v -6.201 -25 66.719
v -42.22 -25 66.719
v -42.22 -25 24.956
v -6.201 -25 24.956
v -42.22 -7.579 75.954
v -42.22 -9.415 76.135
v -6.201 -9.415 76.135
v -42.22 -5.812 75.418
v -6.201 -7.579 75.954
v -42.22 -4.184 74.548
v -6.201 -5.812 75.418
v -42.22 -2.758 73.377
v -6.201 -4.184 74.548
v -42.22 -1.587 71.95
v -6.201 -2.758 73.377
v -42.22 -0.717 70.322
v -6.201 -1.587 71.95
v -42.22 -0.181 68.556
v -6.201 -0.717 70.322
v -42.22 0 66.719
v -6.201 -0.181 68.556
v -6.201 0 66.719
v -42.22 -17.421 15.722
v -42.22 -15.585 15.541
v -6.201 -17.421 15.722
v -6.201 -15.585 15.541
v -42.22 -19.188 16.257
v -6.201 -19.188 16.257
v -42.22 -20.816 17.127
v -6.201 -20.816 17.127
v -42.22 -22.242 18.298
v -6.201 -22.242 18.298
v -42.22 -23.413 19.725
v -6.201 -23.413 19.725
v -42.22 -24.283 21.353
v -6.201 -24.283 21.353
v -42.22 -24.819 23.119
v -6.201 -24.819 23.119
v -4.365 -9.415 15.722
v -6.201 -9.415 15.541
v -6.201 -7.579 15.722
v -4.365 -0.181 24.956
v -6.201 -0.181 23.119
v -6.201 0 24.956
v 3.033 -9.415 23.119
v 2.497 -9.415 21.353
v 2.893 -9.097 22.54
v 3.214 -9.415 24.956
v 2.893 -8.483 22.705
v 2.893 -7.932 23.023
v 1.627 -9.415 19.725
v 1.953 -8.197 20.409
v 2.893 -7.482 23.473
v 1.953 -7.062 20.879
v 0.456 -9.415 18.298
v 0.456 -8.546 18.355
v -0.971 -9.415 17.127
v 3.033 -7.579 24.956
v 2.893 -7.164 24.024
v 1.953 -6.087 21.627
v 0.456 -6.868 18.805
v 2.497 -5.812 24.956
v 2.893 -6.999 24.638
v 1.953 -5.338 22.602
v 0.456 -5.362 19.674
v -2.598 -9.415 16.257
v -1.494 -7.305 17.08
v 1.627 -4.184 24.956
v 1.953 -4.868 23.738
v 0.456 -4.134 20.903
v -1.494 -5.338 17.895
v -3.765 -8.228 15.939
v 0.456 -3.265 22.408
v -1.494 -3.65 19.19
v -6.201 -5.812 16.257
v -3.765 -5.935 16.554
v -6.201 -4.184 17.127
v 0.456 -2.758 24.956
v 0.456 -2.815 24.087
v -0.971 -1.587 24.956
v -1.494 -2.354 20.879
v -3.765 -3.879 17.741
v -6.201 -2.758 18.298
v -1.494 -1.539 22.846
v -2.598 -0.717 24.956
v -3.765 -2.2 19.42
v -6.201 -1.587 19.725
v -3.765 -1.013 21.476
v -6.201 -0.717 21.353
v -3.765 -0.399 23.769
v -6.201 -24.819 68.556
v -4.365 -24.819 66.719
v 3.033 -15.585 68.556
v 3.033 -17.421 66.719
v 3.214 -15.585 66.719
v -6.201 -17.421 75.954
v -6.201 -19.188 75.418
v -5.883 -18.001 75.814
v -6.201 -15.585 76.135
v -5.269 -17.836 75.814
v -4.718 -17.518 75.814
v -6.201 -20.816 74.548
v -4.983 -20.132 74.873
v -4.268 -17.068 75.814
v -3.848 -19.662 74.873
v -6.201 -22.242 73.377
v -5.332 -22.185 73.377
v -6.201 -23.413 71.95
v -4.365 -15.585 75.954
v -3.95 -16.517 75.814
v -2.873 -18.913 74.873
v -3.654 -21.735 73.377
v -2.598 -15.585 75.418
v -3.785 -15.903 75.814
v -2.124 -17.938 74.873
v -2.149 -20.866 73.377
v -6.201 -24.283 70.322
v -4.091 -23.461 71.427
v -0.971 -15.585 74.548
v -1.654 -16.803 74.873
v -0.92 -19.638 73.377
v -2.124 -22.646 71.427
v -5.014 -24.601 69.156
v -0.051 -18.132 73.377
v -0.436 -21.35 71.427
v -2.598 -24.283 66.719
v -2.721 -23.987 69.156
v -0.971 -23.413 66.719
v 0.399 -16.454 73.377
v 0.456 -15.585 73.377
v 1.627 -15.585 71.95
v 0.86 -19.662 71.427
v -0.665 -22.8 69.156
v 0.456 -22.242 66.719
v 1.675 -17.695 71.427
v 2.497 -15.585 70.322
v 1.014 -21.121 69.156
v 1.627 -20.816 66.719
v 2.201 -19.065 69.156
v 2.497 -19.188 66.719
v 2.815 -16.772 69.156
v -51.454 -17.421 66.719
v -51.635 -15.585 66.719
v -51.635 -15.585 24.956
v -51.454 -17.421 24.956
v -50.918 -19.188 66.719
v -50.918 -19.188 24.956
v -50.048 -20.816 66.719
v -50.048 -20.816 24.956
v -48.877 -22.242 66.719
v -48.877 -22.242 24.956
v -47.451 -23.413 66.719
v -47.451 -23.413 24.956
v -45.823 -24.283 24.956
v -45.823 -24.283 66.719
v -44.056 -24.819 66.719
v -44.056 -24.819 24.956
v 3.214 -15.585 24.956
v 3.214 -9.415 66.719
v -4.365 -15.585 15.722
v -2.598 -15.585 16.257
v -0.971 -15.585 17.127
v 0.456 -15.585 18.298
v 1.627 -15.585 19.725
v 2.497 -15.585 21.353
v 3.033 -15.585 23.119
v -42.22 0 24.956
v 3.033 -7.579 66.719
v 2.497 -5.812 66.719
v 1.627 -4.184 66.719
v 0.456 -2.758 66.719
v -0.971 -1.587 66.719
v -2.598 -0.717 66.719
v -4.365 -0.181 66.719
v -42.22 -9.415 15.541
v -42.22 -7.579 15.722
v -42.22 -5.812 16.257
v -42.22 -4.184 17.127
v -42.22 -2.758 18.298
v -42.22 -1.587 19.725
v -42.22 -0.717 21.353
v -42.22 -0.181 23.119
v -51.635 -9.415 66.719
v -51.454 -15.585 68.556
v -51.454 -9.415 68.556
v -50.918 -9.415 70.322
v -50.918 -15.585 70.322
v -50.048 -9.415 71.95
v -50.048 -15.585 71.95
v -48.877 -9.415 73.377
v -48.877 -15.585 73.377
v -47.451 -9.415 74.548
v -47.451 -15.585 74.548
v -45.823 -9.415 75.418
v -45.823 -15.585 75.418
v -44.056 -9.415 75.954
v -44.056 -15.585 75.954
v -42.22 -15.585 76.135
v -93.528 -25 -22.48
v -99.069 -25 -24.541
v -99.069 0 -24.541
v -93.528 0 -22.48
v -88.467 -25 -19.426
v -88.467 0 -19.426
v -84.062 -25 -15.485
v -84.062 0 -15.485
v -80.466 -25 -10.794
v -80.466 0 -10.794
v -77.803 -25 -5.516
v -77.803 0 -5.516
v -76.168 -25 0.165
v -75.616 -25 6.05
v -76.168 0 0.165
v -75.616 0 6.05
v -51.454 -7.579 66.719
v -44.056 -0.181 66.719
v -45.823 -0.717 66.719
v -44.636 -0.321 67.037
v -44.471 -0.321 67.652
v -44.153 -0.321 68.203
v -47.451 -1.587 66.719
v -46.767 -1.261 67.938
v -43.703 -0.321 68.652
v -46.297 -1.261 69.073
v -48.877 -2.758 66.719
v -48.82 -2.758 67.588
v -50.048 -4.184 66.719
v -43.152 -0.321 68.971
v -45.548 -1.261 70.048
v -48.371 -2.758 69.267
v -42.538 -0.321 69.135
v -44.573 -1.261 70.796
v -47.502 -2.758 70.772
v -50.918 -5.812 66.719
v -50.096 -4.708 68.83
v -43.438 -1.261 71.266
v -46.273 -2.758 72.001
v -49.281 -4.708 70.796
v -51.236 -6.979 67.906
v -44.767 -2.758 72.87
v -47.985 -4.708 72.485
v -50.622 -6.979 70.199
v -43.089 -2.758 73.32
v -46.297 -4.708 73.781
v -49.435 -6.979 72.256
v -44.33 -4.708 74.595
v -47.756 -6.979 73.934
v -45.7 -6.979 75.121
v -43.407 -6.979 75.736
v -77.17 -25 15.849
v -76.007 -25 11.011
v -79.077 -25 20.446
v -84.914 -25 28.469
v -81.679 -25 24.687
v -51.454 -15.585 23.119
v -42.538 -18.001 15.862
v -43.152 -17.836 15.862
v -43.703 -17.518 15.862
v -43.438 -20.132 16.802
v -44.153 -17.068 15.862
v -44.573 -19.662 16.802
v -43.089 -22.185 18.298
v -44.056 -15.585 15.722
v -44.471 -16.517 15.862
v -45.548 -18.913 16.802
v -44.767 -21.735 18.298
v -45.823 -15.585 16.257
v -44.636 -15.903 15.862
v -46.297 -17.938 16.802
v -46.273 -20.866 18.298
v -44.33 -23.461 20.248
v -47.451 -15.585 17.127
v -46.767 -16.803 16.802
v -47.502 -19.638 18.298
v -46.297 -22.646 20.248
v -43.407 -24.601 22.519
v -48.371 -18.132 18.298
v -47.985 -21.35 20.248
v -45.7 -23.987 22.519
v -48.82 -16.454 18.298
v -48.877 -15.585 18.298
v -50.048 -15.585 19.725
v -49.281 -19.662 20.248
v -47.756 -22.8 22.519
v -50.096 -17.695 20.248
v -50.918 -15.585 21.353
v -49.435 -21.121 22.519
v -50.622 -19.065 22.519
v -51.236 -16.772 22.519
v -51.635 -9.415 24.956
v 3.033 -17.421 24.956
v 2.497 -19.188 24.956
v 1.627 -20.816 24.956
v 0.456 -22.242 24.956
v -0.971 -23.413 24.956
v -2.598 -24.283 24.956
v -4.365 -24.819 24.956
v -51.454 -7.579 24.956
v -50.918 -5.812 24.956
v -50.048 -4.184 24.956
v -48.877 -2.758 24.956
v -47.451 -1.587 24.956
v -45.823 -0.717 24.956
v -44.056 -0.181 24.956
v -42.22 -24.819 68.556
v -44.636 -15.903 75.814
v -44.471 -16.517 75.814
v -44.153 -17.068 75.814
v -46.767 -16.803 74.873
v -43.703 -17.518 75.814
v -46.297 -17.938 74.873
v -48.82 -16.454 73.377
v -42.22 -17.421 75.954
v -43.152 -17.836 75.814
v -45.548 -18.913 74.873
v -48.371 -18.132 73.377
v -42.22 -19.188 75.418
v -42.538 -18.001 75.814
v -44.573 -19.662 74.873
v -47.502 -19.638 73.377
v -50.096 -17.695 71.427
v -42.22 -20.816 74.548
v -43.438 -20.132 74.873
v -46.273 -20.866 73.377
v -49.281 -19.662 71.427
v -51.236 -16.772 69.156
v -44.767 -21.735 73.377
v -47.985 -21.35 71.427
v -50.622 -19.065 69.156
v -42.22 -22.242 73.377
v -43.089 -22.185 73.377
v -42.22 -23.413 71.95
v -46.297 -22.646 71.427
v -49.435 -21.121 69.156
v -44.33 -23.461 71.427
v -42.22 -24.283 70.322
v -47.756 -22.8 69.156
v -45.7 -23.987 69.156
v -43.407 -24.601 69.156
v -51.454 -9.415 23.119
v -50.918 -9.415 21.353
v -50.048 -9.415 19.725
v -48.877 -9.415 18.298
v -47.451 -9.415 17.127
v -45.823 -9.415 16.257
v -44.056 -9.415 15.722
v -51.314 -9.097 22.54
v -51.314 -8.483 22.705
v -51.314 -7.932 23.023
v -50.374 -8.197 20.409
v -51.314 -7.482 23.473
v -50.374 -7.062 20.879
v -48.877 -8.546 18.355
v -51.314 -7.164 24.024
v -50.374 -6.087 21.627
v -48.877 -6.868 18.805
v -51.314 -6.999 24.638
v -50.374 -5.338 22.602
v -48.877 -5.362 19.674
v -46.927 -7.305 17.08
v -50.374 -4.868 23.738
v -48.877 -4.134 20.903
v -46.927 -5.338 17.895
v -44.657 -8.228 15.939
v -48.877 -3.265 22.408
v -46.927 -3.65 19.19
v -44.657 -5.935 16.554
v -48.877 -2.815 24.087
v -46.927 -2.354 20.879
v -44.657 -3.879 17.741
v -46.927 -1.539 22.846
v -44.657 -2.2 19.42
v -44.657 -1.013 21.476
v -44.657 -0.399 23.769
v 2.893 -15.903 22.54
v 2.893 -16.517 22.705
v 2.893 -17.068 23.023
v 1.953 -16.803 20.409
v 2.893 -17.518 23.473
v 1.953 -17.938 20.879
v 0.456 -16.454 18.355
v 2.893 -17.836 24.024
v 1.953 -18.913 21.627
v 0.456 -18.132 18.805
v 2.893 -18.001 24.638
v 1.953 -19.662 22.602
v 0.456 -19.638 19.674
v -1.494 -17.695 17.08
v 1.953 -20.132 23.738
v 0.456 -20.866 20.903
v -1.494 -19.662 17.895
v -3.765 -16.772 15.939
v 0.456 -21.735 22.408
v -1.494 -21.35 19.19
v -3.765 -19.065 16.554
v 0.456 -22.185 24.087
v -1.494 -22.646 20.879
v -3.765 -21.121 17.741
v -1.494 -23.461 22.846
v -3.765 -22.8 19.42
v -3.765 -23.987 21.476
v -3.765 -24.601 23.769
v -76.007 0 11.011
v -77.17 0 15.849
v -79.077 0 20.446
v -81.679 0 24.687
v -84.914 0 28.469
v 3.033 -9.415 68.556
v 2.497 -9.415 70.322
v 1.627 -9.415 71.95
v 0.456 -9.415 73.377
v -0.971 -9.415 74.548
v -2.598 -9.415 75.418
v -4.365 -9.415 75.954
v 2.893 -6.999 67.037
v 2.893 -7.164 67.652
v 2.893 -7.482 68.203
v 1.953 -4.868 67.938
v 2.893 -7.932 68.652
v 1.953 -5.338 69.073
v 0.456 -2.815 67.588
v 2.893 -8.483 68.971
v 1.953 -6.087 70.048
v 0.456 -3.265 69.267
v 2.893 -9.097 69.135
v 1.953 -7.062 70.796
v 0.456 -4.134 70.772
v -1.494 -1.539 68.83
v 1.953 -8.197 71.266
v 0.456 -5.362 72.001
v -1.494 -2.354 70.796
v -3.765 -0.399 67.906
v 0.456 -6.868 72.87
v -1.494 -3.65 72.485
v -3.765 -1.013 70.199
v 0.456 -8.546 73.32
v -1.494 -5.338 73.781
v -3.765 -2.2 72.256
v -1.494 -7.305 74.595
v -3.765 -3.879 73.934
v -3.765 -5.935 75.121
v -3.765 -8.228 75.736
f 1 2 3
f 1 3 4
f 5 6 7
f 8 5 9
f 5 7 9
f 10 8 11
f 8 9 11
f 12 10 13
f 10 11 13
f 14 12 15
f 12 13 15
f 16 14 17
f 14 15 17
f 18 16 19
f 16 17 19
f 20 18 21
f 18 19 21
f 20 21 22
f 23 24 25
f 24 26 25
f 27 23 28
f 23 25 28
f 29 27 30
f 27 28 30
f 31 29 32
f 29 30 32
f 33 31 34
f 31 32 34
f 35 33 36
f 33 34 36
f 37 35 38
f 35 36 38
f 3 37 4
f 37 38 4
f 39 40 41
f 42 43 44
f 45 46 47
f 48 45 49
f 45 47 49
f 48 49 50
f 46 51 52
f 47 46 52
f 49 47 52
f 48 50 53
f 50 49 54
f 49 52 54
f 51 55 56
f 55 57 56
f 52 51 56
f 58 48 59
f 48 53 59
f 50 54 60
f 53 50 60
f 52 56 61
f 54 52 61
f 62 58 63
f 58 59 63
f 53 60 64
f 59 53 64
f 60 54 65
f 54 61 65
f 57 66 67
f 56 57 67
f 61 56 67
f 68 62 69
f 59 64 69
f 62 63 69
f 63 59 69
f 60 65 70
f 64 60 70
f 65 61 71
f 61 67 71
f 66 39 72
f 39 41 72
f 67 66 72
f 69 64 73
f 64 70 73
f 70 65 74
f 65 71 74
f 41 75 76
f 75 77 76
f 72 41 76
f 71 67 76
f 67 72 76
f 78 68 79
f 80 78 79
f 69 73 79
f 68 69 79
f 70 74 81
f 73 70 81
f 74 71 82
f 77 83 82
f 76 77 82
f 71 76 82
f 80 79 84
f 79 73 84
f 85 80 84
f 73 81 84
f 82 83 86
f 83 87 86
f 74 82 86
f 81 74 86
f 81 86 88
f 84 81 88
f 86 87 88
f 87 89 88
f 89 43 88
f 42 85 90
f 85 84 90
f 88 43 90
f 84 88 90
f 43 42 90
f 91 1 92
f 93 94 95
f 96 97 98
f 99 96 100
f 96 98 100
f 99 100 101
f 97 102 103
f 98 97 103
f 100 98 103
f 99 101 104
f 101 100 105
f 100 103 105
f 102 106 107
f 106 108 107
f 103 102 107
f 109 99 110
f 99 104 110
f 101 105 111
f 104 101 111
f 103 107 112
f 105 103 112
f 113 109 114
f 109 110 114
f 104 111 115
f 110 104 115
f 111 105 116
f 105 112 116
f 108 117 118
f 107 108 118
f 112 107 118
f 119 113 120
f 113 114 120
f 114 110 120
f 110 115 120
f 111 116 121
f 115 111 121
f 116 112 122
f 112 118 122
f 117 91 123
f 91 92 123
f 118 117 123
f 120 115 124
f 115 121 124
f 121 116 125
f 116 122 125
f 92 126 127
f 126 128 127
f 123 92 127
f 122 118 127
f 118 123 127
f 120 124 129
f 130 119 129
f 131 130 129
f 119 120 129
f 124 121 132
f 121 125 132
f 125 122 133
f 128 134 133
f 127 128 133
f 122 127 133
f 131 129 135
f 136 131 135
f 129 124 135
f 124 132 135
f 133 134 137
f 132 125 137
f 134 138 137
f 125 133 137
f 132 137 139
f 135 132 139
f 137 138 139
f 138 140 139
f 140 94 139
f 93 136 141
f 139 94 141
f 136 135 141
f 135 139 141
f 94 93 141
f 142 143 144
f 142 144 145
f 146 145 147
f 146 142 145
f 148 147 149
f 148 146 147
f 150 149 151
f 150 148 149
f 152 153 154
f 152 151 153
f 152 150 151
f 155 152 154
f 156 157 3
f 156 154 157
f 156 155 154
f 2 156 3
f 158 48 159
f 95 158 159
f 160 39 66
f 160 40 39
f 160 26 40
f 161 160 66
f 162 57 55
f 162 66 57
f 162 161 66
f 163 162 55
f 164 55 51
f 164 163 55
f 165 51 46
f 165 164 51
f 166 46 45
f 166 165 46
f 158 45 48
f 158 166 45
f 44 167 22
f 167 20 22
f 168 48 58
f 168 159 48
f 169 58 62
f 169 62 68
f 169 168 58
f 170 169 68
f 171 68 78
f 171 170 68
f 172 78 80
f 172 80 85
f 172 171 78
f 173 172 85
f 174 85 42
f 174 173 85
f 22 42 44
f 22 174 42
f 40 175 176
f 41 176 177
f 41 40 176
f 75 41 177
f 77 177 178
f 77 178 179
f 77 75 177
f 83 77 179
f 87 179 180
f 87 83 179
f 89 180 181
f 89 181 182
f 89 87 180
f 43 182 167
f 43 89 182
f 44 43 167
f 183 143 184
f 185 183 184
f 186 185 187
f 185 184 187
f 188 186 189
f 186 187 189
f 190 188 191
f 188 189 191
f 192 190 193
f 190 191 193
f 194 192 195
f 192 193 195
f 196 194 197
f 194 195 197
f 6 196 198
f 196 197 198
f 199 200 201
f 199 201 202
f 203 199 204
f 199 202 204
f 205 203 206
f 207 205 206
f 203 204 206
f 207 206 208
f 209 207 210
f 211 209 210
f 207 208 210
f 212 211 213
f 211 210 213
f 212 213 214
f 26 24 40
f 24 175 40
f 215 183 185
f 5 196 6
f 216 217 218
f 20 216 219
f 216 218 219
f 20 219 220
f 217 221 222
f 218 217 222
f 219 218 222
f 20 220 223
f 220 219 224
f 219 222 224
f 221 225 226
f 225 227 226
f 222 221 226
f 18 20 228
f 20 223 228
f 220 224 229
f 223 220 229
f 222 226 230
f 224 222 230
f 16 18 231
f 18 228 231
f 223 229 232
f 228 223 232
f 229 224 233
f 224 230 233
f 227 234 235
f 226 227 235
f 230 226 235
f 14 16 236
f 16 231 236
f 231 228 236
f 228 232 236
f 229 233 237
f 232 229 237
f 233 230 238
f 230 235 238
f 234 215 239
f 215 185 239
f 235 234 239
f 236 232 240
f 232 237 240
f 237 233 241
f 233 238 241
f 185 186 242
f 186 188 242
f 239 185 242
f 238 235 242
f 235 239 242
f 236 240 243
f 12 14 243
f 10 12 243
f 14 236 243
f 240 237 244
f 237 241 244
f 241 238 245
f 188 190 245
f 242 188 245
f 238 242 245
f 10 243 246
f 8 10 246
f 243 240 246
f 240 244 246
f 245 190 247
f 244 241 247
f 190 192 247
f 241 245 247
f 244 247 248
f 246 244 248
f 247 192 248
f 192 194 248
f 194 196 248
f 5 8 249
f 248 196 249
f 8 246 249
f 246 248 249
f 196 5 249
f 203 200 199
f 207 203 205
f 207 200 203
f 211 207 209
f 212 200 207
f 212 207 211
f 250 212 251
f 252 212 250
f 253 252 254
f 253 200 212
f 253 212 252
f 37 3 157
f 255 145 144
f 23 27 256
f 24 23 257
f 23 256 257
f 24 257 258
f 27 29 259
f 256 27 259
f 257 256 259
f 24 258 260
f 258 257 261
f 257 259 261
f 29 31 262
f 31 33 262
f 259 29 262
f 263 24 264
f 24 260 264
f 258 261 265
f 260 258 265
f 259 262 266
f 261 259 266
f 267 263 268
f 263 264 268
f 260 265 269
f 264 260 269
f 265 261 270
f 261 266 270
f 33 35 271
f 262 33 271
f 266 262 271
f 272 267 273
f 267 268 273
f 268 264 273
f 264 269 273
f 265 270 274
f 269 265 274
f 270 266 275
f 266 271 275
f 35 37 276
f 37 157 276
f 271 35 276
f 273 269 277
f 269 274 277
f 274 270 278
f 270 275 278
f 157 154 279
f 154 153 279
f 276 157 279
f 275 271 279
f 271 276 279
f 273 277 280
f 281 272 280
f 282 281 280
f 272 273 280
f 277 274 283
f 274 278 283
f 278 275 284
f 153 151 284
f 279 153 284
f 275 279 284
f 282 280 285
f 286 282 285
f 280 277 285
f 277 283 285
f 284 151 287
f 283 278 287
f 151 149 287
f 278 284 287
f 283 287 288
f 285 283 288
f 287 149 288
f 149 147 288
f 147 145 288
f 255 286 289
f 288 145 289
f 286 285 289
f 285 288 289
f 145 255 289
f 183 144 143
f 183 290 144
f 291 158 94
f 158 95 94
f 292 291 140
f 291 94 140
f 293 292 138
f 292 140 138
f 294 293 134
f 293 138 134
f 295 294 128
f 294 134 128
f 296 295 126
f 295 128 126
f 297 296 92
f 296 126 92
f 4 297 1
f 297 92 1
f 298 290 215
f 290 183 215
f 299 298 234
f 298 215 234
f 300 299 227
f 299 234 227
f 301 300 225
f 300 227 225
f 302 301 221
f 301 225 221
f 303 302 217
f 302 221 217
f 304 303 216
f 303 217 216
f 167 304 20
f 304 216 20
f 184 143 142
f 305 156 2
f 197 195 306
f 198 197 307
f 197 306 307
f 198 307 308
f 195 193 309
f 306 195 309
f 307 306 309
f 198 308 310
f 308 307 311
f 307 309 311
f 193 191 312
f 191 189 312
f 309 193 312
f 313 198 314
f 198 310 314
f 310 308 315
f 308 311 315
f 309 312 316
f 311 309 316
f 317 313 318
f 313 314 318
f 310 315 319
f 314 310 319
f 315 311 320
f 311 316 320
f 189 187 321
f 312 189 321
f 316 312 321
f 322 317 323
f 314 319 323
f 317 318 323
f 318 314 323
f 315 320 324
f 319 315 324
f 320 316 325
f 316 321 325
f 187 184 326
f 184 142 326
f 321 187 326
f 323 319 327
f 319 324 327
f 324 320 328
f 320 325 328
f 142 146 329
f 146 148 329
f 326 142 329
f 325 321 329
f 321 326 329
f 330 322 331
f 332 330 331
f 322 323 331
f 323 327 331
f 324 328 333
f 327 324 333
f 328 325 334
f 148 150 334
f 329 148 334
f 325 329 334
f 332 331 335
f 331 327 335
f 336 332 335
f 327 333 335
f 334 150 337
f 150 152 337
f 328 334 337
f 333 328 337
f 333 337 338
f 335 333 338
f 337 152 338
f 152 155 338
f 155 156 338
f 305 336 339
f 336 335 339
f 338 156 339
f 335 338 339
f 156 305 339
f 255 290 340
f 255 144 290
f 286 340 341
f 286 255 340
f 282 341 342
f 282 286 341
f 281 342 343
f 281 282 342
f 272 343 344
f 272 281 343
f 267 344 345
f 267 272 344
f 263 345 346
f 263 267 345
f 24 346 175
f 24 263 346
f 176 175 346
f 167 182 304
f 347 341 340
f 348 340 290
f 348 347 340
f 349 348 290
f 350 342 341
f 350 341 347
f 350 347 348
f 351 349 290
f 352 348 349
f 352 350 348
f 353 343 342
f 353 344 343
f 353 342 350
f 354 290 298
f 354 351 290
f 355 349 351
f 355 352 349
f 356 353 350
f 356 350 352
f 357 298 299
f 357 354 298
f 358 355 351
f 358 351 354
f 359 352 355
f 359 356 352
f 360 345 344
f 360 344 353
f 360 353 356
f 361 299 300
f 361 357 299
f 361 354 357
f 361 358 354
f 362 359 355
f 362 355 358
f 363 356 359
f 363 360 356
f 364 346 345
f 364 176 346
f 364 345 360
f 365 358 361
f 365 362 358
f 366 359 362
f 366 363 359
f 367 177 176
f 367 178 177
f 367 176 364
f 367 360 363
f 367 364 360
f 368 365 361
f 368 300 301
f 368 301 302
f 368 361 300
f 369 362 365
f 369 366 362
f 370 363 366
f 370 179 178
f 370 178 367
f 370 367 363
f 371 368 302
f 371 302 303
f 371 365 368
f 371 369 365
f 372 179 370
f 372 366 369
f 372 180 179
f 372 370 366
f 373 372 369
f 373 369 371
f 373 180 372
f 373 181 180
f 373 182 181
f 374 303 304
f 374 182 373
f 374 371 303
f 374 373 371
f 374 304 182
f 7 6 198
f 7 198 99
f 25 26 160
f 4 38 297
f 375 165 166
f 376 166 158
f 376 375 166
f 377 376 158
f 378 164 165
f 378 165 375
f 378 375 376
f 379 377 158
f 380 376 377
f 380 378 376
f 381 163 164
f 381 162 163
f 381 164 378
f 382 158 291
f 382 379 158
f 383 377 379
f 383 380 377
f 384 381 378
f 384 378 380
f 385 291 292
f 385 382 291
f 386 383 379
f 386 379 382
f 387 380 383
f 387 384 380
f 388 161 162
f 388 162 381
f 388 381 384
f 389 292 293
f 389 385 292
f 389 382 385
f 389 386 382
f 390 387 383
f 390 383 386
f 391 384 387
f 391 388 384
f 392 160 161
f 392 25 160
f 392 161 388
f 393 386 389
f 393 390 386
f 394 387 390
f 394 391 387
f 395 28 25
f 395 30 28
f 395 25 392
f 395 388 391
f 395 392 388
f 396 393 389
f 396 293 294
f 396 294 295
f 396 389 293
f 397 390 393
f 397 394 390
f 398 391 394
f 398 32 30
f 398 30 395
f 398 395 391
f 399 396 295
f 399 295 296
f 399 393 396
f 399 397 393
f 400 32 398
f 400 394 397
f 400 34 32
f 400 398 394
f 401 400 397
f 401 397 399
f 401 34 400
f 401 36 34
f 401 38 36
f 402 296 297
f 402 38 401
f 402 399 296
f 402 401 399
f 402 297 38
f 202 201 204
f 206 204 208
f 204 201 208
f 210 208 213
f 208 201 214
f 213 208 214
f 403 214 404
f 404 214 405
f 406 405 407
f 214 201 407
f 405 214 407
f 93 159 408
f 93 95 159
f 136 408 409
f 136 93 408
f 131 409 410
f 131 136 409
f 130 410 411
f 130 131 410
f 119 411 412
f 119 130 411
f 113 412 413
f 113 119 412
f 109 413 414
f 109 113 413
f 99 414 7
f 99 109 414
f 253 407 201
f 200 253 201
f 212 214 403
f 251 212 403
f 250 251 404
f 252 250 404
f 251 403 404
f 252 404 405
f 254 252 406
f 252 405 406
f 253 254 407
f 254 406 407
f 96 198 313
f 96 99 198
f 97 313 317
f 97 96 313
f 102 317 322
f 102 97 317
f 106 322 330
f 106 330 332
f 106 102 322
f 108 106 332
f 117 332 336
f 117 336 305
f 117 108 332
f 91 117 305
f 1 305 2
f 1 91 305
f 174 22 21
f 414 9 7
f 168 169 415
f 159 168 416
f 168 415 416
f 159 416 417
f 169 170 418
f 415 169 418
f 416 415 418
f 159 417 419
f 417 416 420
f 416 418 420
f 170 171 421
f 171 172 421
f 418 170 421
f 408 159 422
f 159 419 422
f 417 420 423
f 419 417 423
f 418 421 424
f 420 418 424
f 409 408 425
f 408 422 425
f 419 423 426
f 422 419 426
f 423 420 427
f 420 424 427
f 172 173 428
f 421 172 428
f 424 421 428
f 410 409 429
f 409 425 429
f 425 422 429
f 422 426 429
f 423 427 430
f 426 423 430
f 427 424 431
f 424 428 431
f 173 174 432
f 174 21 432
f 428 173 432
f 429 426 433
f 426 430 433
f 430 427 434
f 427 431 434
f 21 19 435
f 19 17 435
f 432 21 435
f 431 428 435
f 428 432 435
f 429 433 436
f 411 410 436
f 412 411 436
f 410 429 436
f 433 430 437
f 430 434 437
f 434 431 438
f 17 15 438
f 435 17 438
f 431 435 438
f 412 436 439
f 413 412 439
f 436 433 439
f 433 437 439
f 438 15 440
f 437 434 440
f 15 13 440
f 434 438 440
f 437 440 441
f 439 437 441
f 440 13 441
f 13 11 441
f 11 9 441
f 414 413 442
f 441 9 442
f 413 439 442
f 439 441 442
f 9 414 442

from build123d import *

# Parameters (mm, degrees)
F2_DEPTH = 25
F3_W     = 54.8490260262
F3_H     = 60.5938415974
F4_DEPTH = 25
F5_R     = 9.4154328933


# Not quite as in the source:
# - the program builds the solid bodies; features that only make, move or delete a surface that nothing else refers to are left out


with BuildPart() as f2:
    # F0 (on Front) → F2 (new body)
    with BuildSketch(Plane.XZ):
        with BuildLine():
            ThreePointArc((-99.0687261738, -24.5411251405), (-82.1541433894, -13.2232410682), (-75.616435726, 6.0499524698))
            ThreePointArc((-75.616435726, 6.0499524698), (-78.0330079972, 18.1851301237), (-84.9140211289, 28.4688073121))
            Line((-84.9140211289, 28.4688073121), (-99.0687261738, -24.5411251405))
        make_face()
    extrude(amount=F2_DEPTH)


with BuildPart() as f4:
    # F3 (on Front) → F4 (new body)
    with BuildSketch(Plane.XZ):
        with Locations((-24.2105474463, 45.8376193419)):
            Rectangle(F3_W, F3_H)
    extrude(amount=F4_DEPTH)

    # F5
    f5_edges = [f4.edges().sort_by_distance(p)[0] for p in [
        (-51.63506, -25, 45.837619),
        (-24.210547, -25, 15.540699),
        (-24.210547, 0, 15.540699),
        (3.213966, -12.5, 15.540699),
        (-51.63506, -12.5, 15.540699),
        (-51.63506, -12.5, 76.13454),
        (3.213966, -25, 45.837619),
        (-51.63506, 0, 45.837619),
        (-24.210547, -25, 76.13454),
        (-24.210547, 0, 76.13454),
        (3.213966, 0, 45.837619),
        (3.213966, -12.5, 76.13454),
    ]]
    fillet(f5_edges, radius=F5_R)


solid = Compound([f2.part, f4.part])
